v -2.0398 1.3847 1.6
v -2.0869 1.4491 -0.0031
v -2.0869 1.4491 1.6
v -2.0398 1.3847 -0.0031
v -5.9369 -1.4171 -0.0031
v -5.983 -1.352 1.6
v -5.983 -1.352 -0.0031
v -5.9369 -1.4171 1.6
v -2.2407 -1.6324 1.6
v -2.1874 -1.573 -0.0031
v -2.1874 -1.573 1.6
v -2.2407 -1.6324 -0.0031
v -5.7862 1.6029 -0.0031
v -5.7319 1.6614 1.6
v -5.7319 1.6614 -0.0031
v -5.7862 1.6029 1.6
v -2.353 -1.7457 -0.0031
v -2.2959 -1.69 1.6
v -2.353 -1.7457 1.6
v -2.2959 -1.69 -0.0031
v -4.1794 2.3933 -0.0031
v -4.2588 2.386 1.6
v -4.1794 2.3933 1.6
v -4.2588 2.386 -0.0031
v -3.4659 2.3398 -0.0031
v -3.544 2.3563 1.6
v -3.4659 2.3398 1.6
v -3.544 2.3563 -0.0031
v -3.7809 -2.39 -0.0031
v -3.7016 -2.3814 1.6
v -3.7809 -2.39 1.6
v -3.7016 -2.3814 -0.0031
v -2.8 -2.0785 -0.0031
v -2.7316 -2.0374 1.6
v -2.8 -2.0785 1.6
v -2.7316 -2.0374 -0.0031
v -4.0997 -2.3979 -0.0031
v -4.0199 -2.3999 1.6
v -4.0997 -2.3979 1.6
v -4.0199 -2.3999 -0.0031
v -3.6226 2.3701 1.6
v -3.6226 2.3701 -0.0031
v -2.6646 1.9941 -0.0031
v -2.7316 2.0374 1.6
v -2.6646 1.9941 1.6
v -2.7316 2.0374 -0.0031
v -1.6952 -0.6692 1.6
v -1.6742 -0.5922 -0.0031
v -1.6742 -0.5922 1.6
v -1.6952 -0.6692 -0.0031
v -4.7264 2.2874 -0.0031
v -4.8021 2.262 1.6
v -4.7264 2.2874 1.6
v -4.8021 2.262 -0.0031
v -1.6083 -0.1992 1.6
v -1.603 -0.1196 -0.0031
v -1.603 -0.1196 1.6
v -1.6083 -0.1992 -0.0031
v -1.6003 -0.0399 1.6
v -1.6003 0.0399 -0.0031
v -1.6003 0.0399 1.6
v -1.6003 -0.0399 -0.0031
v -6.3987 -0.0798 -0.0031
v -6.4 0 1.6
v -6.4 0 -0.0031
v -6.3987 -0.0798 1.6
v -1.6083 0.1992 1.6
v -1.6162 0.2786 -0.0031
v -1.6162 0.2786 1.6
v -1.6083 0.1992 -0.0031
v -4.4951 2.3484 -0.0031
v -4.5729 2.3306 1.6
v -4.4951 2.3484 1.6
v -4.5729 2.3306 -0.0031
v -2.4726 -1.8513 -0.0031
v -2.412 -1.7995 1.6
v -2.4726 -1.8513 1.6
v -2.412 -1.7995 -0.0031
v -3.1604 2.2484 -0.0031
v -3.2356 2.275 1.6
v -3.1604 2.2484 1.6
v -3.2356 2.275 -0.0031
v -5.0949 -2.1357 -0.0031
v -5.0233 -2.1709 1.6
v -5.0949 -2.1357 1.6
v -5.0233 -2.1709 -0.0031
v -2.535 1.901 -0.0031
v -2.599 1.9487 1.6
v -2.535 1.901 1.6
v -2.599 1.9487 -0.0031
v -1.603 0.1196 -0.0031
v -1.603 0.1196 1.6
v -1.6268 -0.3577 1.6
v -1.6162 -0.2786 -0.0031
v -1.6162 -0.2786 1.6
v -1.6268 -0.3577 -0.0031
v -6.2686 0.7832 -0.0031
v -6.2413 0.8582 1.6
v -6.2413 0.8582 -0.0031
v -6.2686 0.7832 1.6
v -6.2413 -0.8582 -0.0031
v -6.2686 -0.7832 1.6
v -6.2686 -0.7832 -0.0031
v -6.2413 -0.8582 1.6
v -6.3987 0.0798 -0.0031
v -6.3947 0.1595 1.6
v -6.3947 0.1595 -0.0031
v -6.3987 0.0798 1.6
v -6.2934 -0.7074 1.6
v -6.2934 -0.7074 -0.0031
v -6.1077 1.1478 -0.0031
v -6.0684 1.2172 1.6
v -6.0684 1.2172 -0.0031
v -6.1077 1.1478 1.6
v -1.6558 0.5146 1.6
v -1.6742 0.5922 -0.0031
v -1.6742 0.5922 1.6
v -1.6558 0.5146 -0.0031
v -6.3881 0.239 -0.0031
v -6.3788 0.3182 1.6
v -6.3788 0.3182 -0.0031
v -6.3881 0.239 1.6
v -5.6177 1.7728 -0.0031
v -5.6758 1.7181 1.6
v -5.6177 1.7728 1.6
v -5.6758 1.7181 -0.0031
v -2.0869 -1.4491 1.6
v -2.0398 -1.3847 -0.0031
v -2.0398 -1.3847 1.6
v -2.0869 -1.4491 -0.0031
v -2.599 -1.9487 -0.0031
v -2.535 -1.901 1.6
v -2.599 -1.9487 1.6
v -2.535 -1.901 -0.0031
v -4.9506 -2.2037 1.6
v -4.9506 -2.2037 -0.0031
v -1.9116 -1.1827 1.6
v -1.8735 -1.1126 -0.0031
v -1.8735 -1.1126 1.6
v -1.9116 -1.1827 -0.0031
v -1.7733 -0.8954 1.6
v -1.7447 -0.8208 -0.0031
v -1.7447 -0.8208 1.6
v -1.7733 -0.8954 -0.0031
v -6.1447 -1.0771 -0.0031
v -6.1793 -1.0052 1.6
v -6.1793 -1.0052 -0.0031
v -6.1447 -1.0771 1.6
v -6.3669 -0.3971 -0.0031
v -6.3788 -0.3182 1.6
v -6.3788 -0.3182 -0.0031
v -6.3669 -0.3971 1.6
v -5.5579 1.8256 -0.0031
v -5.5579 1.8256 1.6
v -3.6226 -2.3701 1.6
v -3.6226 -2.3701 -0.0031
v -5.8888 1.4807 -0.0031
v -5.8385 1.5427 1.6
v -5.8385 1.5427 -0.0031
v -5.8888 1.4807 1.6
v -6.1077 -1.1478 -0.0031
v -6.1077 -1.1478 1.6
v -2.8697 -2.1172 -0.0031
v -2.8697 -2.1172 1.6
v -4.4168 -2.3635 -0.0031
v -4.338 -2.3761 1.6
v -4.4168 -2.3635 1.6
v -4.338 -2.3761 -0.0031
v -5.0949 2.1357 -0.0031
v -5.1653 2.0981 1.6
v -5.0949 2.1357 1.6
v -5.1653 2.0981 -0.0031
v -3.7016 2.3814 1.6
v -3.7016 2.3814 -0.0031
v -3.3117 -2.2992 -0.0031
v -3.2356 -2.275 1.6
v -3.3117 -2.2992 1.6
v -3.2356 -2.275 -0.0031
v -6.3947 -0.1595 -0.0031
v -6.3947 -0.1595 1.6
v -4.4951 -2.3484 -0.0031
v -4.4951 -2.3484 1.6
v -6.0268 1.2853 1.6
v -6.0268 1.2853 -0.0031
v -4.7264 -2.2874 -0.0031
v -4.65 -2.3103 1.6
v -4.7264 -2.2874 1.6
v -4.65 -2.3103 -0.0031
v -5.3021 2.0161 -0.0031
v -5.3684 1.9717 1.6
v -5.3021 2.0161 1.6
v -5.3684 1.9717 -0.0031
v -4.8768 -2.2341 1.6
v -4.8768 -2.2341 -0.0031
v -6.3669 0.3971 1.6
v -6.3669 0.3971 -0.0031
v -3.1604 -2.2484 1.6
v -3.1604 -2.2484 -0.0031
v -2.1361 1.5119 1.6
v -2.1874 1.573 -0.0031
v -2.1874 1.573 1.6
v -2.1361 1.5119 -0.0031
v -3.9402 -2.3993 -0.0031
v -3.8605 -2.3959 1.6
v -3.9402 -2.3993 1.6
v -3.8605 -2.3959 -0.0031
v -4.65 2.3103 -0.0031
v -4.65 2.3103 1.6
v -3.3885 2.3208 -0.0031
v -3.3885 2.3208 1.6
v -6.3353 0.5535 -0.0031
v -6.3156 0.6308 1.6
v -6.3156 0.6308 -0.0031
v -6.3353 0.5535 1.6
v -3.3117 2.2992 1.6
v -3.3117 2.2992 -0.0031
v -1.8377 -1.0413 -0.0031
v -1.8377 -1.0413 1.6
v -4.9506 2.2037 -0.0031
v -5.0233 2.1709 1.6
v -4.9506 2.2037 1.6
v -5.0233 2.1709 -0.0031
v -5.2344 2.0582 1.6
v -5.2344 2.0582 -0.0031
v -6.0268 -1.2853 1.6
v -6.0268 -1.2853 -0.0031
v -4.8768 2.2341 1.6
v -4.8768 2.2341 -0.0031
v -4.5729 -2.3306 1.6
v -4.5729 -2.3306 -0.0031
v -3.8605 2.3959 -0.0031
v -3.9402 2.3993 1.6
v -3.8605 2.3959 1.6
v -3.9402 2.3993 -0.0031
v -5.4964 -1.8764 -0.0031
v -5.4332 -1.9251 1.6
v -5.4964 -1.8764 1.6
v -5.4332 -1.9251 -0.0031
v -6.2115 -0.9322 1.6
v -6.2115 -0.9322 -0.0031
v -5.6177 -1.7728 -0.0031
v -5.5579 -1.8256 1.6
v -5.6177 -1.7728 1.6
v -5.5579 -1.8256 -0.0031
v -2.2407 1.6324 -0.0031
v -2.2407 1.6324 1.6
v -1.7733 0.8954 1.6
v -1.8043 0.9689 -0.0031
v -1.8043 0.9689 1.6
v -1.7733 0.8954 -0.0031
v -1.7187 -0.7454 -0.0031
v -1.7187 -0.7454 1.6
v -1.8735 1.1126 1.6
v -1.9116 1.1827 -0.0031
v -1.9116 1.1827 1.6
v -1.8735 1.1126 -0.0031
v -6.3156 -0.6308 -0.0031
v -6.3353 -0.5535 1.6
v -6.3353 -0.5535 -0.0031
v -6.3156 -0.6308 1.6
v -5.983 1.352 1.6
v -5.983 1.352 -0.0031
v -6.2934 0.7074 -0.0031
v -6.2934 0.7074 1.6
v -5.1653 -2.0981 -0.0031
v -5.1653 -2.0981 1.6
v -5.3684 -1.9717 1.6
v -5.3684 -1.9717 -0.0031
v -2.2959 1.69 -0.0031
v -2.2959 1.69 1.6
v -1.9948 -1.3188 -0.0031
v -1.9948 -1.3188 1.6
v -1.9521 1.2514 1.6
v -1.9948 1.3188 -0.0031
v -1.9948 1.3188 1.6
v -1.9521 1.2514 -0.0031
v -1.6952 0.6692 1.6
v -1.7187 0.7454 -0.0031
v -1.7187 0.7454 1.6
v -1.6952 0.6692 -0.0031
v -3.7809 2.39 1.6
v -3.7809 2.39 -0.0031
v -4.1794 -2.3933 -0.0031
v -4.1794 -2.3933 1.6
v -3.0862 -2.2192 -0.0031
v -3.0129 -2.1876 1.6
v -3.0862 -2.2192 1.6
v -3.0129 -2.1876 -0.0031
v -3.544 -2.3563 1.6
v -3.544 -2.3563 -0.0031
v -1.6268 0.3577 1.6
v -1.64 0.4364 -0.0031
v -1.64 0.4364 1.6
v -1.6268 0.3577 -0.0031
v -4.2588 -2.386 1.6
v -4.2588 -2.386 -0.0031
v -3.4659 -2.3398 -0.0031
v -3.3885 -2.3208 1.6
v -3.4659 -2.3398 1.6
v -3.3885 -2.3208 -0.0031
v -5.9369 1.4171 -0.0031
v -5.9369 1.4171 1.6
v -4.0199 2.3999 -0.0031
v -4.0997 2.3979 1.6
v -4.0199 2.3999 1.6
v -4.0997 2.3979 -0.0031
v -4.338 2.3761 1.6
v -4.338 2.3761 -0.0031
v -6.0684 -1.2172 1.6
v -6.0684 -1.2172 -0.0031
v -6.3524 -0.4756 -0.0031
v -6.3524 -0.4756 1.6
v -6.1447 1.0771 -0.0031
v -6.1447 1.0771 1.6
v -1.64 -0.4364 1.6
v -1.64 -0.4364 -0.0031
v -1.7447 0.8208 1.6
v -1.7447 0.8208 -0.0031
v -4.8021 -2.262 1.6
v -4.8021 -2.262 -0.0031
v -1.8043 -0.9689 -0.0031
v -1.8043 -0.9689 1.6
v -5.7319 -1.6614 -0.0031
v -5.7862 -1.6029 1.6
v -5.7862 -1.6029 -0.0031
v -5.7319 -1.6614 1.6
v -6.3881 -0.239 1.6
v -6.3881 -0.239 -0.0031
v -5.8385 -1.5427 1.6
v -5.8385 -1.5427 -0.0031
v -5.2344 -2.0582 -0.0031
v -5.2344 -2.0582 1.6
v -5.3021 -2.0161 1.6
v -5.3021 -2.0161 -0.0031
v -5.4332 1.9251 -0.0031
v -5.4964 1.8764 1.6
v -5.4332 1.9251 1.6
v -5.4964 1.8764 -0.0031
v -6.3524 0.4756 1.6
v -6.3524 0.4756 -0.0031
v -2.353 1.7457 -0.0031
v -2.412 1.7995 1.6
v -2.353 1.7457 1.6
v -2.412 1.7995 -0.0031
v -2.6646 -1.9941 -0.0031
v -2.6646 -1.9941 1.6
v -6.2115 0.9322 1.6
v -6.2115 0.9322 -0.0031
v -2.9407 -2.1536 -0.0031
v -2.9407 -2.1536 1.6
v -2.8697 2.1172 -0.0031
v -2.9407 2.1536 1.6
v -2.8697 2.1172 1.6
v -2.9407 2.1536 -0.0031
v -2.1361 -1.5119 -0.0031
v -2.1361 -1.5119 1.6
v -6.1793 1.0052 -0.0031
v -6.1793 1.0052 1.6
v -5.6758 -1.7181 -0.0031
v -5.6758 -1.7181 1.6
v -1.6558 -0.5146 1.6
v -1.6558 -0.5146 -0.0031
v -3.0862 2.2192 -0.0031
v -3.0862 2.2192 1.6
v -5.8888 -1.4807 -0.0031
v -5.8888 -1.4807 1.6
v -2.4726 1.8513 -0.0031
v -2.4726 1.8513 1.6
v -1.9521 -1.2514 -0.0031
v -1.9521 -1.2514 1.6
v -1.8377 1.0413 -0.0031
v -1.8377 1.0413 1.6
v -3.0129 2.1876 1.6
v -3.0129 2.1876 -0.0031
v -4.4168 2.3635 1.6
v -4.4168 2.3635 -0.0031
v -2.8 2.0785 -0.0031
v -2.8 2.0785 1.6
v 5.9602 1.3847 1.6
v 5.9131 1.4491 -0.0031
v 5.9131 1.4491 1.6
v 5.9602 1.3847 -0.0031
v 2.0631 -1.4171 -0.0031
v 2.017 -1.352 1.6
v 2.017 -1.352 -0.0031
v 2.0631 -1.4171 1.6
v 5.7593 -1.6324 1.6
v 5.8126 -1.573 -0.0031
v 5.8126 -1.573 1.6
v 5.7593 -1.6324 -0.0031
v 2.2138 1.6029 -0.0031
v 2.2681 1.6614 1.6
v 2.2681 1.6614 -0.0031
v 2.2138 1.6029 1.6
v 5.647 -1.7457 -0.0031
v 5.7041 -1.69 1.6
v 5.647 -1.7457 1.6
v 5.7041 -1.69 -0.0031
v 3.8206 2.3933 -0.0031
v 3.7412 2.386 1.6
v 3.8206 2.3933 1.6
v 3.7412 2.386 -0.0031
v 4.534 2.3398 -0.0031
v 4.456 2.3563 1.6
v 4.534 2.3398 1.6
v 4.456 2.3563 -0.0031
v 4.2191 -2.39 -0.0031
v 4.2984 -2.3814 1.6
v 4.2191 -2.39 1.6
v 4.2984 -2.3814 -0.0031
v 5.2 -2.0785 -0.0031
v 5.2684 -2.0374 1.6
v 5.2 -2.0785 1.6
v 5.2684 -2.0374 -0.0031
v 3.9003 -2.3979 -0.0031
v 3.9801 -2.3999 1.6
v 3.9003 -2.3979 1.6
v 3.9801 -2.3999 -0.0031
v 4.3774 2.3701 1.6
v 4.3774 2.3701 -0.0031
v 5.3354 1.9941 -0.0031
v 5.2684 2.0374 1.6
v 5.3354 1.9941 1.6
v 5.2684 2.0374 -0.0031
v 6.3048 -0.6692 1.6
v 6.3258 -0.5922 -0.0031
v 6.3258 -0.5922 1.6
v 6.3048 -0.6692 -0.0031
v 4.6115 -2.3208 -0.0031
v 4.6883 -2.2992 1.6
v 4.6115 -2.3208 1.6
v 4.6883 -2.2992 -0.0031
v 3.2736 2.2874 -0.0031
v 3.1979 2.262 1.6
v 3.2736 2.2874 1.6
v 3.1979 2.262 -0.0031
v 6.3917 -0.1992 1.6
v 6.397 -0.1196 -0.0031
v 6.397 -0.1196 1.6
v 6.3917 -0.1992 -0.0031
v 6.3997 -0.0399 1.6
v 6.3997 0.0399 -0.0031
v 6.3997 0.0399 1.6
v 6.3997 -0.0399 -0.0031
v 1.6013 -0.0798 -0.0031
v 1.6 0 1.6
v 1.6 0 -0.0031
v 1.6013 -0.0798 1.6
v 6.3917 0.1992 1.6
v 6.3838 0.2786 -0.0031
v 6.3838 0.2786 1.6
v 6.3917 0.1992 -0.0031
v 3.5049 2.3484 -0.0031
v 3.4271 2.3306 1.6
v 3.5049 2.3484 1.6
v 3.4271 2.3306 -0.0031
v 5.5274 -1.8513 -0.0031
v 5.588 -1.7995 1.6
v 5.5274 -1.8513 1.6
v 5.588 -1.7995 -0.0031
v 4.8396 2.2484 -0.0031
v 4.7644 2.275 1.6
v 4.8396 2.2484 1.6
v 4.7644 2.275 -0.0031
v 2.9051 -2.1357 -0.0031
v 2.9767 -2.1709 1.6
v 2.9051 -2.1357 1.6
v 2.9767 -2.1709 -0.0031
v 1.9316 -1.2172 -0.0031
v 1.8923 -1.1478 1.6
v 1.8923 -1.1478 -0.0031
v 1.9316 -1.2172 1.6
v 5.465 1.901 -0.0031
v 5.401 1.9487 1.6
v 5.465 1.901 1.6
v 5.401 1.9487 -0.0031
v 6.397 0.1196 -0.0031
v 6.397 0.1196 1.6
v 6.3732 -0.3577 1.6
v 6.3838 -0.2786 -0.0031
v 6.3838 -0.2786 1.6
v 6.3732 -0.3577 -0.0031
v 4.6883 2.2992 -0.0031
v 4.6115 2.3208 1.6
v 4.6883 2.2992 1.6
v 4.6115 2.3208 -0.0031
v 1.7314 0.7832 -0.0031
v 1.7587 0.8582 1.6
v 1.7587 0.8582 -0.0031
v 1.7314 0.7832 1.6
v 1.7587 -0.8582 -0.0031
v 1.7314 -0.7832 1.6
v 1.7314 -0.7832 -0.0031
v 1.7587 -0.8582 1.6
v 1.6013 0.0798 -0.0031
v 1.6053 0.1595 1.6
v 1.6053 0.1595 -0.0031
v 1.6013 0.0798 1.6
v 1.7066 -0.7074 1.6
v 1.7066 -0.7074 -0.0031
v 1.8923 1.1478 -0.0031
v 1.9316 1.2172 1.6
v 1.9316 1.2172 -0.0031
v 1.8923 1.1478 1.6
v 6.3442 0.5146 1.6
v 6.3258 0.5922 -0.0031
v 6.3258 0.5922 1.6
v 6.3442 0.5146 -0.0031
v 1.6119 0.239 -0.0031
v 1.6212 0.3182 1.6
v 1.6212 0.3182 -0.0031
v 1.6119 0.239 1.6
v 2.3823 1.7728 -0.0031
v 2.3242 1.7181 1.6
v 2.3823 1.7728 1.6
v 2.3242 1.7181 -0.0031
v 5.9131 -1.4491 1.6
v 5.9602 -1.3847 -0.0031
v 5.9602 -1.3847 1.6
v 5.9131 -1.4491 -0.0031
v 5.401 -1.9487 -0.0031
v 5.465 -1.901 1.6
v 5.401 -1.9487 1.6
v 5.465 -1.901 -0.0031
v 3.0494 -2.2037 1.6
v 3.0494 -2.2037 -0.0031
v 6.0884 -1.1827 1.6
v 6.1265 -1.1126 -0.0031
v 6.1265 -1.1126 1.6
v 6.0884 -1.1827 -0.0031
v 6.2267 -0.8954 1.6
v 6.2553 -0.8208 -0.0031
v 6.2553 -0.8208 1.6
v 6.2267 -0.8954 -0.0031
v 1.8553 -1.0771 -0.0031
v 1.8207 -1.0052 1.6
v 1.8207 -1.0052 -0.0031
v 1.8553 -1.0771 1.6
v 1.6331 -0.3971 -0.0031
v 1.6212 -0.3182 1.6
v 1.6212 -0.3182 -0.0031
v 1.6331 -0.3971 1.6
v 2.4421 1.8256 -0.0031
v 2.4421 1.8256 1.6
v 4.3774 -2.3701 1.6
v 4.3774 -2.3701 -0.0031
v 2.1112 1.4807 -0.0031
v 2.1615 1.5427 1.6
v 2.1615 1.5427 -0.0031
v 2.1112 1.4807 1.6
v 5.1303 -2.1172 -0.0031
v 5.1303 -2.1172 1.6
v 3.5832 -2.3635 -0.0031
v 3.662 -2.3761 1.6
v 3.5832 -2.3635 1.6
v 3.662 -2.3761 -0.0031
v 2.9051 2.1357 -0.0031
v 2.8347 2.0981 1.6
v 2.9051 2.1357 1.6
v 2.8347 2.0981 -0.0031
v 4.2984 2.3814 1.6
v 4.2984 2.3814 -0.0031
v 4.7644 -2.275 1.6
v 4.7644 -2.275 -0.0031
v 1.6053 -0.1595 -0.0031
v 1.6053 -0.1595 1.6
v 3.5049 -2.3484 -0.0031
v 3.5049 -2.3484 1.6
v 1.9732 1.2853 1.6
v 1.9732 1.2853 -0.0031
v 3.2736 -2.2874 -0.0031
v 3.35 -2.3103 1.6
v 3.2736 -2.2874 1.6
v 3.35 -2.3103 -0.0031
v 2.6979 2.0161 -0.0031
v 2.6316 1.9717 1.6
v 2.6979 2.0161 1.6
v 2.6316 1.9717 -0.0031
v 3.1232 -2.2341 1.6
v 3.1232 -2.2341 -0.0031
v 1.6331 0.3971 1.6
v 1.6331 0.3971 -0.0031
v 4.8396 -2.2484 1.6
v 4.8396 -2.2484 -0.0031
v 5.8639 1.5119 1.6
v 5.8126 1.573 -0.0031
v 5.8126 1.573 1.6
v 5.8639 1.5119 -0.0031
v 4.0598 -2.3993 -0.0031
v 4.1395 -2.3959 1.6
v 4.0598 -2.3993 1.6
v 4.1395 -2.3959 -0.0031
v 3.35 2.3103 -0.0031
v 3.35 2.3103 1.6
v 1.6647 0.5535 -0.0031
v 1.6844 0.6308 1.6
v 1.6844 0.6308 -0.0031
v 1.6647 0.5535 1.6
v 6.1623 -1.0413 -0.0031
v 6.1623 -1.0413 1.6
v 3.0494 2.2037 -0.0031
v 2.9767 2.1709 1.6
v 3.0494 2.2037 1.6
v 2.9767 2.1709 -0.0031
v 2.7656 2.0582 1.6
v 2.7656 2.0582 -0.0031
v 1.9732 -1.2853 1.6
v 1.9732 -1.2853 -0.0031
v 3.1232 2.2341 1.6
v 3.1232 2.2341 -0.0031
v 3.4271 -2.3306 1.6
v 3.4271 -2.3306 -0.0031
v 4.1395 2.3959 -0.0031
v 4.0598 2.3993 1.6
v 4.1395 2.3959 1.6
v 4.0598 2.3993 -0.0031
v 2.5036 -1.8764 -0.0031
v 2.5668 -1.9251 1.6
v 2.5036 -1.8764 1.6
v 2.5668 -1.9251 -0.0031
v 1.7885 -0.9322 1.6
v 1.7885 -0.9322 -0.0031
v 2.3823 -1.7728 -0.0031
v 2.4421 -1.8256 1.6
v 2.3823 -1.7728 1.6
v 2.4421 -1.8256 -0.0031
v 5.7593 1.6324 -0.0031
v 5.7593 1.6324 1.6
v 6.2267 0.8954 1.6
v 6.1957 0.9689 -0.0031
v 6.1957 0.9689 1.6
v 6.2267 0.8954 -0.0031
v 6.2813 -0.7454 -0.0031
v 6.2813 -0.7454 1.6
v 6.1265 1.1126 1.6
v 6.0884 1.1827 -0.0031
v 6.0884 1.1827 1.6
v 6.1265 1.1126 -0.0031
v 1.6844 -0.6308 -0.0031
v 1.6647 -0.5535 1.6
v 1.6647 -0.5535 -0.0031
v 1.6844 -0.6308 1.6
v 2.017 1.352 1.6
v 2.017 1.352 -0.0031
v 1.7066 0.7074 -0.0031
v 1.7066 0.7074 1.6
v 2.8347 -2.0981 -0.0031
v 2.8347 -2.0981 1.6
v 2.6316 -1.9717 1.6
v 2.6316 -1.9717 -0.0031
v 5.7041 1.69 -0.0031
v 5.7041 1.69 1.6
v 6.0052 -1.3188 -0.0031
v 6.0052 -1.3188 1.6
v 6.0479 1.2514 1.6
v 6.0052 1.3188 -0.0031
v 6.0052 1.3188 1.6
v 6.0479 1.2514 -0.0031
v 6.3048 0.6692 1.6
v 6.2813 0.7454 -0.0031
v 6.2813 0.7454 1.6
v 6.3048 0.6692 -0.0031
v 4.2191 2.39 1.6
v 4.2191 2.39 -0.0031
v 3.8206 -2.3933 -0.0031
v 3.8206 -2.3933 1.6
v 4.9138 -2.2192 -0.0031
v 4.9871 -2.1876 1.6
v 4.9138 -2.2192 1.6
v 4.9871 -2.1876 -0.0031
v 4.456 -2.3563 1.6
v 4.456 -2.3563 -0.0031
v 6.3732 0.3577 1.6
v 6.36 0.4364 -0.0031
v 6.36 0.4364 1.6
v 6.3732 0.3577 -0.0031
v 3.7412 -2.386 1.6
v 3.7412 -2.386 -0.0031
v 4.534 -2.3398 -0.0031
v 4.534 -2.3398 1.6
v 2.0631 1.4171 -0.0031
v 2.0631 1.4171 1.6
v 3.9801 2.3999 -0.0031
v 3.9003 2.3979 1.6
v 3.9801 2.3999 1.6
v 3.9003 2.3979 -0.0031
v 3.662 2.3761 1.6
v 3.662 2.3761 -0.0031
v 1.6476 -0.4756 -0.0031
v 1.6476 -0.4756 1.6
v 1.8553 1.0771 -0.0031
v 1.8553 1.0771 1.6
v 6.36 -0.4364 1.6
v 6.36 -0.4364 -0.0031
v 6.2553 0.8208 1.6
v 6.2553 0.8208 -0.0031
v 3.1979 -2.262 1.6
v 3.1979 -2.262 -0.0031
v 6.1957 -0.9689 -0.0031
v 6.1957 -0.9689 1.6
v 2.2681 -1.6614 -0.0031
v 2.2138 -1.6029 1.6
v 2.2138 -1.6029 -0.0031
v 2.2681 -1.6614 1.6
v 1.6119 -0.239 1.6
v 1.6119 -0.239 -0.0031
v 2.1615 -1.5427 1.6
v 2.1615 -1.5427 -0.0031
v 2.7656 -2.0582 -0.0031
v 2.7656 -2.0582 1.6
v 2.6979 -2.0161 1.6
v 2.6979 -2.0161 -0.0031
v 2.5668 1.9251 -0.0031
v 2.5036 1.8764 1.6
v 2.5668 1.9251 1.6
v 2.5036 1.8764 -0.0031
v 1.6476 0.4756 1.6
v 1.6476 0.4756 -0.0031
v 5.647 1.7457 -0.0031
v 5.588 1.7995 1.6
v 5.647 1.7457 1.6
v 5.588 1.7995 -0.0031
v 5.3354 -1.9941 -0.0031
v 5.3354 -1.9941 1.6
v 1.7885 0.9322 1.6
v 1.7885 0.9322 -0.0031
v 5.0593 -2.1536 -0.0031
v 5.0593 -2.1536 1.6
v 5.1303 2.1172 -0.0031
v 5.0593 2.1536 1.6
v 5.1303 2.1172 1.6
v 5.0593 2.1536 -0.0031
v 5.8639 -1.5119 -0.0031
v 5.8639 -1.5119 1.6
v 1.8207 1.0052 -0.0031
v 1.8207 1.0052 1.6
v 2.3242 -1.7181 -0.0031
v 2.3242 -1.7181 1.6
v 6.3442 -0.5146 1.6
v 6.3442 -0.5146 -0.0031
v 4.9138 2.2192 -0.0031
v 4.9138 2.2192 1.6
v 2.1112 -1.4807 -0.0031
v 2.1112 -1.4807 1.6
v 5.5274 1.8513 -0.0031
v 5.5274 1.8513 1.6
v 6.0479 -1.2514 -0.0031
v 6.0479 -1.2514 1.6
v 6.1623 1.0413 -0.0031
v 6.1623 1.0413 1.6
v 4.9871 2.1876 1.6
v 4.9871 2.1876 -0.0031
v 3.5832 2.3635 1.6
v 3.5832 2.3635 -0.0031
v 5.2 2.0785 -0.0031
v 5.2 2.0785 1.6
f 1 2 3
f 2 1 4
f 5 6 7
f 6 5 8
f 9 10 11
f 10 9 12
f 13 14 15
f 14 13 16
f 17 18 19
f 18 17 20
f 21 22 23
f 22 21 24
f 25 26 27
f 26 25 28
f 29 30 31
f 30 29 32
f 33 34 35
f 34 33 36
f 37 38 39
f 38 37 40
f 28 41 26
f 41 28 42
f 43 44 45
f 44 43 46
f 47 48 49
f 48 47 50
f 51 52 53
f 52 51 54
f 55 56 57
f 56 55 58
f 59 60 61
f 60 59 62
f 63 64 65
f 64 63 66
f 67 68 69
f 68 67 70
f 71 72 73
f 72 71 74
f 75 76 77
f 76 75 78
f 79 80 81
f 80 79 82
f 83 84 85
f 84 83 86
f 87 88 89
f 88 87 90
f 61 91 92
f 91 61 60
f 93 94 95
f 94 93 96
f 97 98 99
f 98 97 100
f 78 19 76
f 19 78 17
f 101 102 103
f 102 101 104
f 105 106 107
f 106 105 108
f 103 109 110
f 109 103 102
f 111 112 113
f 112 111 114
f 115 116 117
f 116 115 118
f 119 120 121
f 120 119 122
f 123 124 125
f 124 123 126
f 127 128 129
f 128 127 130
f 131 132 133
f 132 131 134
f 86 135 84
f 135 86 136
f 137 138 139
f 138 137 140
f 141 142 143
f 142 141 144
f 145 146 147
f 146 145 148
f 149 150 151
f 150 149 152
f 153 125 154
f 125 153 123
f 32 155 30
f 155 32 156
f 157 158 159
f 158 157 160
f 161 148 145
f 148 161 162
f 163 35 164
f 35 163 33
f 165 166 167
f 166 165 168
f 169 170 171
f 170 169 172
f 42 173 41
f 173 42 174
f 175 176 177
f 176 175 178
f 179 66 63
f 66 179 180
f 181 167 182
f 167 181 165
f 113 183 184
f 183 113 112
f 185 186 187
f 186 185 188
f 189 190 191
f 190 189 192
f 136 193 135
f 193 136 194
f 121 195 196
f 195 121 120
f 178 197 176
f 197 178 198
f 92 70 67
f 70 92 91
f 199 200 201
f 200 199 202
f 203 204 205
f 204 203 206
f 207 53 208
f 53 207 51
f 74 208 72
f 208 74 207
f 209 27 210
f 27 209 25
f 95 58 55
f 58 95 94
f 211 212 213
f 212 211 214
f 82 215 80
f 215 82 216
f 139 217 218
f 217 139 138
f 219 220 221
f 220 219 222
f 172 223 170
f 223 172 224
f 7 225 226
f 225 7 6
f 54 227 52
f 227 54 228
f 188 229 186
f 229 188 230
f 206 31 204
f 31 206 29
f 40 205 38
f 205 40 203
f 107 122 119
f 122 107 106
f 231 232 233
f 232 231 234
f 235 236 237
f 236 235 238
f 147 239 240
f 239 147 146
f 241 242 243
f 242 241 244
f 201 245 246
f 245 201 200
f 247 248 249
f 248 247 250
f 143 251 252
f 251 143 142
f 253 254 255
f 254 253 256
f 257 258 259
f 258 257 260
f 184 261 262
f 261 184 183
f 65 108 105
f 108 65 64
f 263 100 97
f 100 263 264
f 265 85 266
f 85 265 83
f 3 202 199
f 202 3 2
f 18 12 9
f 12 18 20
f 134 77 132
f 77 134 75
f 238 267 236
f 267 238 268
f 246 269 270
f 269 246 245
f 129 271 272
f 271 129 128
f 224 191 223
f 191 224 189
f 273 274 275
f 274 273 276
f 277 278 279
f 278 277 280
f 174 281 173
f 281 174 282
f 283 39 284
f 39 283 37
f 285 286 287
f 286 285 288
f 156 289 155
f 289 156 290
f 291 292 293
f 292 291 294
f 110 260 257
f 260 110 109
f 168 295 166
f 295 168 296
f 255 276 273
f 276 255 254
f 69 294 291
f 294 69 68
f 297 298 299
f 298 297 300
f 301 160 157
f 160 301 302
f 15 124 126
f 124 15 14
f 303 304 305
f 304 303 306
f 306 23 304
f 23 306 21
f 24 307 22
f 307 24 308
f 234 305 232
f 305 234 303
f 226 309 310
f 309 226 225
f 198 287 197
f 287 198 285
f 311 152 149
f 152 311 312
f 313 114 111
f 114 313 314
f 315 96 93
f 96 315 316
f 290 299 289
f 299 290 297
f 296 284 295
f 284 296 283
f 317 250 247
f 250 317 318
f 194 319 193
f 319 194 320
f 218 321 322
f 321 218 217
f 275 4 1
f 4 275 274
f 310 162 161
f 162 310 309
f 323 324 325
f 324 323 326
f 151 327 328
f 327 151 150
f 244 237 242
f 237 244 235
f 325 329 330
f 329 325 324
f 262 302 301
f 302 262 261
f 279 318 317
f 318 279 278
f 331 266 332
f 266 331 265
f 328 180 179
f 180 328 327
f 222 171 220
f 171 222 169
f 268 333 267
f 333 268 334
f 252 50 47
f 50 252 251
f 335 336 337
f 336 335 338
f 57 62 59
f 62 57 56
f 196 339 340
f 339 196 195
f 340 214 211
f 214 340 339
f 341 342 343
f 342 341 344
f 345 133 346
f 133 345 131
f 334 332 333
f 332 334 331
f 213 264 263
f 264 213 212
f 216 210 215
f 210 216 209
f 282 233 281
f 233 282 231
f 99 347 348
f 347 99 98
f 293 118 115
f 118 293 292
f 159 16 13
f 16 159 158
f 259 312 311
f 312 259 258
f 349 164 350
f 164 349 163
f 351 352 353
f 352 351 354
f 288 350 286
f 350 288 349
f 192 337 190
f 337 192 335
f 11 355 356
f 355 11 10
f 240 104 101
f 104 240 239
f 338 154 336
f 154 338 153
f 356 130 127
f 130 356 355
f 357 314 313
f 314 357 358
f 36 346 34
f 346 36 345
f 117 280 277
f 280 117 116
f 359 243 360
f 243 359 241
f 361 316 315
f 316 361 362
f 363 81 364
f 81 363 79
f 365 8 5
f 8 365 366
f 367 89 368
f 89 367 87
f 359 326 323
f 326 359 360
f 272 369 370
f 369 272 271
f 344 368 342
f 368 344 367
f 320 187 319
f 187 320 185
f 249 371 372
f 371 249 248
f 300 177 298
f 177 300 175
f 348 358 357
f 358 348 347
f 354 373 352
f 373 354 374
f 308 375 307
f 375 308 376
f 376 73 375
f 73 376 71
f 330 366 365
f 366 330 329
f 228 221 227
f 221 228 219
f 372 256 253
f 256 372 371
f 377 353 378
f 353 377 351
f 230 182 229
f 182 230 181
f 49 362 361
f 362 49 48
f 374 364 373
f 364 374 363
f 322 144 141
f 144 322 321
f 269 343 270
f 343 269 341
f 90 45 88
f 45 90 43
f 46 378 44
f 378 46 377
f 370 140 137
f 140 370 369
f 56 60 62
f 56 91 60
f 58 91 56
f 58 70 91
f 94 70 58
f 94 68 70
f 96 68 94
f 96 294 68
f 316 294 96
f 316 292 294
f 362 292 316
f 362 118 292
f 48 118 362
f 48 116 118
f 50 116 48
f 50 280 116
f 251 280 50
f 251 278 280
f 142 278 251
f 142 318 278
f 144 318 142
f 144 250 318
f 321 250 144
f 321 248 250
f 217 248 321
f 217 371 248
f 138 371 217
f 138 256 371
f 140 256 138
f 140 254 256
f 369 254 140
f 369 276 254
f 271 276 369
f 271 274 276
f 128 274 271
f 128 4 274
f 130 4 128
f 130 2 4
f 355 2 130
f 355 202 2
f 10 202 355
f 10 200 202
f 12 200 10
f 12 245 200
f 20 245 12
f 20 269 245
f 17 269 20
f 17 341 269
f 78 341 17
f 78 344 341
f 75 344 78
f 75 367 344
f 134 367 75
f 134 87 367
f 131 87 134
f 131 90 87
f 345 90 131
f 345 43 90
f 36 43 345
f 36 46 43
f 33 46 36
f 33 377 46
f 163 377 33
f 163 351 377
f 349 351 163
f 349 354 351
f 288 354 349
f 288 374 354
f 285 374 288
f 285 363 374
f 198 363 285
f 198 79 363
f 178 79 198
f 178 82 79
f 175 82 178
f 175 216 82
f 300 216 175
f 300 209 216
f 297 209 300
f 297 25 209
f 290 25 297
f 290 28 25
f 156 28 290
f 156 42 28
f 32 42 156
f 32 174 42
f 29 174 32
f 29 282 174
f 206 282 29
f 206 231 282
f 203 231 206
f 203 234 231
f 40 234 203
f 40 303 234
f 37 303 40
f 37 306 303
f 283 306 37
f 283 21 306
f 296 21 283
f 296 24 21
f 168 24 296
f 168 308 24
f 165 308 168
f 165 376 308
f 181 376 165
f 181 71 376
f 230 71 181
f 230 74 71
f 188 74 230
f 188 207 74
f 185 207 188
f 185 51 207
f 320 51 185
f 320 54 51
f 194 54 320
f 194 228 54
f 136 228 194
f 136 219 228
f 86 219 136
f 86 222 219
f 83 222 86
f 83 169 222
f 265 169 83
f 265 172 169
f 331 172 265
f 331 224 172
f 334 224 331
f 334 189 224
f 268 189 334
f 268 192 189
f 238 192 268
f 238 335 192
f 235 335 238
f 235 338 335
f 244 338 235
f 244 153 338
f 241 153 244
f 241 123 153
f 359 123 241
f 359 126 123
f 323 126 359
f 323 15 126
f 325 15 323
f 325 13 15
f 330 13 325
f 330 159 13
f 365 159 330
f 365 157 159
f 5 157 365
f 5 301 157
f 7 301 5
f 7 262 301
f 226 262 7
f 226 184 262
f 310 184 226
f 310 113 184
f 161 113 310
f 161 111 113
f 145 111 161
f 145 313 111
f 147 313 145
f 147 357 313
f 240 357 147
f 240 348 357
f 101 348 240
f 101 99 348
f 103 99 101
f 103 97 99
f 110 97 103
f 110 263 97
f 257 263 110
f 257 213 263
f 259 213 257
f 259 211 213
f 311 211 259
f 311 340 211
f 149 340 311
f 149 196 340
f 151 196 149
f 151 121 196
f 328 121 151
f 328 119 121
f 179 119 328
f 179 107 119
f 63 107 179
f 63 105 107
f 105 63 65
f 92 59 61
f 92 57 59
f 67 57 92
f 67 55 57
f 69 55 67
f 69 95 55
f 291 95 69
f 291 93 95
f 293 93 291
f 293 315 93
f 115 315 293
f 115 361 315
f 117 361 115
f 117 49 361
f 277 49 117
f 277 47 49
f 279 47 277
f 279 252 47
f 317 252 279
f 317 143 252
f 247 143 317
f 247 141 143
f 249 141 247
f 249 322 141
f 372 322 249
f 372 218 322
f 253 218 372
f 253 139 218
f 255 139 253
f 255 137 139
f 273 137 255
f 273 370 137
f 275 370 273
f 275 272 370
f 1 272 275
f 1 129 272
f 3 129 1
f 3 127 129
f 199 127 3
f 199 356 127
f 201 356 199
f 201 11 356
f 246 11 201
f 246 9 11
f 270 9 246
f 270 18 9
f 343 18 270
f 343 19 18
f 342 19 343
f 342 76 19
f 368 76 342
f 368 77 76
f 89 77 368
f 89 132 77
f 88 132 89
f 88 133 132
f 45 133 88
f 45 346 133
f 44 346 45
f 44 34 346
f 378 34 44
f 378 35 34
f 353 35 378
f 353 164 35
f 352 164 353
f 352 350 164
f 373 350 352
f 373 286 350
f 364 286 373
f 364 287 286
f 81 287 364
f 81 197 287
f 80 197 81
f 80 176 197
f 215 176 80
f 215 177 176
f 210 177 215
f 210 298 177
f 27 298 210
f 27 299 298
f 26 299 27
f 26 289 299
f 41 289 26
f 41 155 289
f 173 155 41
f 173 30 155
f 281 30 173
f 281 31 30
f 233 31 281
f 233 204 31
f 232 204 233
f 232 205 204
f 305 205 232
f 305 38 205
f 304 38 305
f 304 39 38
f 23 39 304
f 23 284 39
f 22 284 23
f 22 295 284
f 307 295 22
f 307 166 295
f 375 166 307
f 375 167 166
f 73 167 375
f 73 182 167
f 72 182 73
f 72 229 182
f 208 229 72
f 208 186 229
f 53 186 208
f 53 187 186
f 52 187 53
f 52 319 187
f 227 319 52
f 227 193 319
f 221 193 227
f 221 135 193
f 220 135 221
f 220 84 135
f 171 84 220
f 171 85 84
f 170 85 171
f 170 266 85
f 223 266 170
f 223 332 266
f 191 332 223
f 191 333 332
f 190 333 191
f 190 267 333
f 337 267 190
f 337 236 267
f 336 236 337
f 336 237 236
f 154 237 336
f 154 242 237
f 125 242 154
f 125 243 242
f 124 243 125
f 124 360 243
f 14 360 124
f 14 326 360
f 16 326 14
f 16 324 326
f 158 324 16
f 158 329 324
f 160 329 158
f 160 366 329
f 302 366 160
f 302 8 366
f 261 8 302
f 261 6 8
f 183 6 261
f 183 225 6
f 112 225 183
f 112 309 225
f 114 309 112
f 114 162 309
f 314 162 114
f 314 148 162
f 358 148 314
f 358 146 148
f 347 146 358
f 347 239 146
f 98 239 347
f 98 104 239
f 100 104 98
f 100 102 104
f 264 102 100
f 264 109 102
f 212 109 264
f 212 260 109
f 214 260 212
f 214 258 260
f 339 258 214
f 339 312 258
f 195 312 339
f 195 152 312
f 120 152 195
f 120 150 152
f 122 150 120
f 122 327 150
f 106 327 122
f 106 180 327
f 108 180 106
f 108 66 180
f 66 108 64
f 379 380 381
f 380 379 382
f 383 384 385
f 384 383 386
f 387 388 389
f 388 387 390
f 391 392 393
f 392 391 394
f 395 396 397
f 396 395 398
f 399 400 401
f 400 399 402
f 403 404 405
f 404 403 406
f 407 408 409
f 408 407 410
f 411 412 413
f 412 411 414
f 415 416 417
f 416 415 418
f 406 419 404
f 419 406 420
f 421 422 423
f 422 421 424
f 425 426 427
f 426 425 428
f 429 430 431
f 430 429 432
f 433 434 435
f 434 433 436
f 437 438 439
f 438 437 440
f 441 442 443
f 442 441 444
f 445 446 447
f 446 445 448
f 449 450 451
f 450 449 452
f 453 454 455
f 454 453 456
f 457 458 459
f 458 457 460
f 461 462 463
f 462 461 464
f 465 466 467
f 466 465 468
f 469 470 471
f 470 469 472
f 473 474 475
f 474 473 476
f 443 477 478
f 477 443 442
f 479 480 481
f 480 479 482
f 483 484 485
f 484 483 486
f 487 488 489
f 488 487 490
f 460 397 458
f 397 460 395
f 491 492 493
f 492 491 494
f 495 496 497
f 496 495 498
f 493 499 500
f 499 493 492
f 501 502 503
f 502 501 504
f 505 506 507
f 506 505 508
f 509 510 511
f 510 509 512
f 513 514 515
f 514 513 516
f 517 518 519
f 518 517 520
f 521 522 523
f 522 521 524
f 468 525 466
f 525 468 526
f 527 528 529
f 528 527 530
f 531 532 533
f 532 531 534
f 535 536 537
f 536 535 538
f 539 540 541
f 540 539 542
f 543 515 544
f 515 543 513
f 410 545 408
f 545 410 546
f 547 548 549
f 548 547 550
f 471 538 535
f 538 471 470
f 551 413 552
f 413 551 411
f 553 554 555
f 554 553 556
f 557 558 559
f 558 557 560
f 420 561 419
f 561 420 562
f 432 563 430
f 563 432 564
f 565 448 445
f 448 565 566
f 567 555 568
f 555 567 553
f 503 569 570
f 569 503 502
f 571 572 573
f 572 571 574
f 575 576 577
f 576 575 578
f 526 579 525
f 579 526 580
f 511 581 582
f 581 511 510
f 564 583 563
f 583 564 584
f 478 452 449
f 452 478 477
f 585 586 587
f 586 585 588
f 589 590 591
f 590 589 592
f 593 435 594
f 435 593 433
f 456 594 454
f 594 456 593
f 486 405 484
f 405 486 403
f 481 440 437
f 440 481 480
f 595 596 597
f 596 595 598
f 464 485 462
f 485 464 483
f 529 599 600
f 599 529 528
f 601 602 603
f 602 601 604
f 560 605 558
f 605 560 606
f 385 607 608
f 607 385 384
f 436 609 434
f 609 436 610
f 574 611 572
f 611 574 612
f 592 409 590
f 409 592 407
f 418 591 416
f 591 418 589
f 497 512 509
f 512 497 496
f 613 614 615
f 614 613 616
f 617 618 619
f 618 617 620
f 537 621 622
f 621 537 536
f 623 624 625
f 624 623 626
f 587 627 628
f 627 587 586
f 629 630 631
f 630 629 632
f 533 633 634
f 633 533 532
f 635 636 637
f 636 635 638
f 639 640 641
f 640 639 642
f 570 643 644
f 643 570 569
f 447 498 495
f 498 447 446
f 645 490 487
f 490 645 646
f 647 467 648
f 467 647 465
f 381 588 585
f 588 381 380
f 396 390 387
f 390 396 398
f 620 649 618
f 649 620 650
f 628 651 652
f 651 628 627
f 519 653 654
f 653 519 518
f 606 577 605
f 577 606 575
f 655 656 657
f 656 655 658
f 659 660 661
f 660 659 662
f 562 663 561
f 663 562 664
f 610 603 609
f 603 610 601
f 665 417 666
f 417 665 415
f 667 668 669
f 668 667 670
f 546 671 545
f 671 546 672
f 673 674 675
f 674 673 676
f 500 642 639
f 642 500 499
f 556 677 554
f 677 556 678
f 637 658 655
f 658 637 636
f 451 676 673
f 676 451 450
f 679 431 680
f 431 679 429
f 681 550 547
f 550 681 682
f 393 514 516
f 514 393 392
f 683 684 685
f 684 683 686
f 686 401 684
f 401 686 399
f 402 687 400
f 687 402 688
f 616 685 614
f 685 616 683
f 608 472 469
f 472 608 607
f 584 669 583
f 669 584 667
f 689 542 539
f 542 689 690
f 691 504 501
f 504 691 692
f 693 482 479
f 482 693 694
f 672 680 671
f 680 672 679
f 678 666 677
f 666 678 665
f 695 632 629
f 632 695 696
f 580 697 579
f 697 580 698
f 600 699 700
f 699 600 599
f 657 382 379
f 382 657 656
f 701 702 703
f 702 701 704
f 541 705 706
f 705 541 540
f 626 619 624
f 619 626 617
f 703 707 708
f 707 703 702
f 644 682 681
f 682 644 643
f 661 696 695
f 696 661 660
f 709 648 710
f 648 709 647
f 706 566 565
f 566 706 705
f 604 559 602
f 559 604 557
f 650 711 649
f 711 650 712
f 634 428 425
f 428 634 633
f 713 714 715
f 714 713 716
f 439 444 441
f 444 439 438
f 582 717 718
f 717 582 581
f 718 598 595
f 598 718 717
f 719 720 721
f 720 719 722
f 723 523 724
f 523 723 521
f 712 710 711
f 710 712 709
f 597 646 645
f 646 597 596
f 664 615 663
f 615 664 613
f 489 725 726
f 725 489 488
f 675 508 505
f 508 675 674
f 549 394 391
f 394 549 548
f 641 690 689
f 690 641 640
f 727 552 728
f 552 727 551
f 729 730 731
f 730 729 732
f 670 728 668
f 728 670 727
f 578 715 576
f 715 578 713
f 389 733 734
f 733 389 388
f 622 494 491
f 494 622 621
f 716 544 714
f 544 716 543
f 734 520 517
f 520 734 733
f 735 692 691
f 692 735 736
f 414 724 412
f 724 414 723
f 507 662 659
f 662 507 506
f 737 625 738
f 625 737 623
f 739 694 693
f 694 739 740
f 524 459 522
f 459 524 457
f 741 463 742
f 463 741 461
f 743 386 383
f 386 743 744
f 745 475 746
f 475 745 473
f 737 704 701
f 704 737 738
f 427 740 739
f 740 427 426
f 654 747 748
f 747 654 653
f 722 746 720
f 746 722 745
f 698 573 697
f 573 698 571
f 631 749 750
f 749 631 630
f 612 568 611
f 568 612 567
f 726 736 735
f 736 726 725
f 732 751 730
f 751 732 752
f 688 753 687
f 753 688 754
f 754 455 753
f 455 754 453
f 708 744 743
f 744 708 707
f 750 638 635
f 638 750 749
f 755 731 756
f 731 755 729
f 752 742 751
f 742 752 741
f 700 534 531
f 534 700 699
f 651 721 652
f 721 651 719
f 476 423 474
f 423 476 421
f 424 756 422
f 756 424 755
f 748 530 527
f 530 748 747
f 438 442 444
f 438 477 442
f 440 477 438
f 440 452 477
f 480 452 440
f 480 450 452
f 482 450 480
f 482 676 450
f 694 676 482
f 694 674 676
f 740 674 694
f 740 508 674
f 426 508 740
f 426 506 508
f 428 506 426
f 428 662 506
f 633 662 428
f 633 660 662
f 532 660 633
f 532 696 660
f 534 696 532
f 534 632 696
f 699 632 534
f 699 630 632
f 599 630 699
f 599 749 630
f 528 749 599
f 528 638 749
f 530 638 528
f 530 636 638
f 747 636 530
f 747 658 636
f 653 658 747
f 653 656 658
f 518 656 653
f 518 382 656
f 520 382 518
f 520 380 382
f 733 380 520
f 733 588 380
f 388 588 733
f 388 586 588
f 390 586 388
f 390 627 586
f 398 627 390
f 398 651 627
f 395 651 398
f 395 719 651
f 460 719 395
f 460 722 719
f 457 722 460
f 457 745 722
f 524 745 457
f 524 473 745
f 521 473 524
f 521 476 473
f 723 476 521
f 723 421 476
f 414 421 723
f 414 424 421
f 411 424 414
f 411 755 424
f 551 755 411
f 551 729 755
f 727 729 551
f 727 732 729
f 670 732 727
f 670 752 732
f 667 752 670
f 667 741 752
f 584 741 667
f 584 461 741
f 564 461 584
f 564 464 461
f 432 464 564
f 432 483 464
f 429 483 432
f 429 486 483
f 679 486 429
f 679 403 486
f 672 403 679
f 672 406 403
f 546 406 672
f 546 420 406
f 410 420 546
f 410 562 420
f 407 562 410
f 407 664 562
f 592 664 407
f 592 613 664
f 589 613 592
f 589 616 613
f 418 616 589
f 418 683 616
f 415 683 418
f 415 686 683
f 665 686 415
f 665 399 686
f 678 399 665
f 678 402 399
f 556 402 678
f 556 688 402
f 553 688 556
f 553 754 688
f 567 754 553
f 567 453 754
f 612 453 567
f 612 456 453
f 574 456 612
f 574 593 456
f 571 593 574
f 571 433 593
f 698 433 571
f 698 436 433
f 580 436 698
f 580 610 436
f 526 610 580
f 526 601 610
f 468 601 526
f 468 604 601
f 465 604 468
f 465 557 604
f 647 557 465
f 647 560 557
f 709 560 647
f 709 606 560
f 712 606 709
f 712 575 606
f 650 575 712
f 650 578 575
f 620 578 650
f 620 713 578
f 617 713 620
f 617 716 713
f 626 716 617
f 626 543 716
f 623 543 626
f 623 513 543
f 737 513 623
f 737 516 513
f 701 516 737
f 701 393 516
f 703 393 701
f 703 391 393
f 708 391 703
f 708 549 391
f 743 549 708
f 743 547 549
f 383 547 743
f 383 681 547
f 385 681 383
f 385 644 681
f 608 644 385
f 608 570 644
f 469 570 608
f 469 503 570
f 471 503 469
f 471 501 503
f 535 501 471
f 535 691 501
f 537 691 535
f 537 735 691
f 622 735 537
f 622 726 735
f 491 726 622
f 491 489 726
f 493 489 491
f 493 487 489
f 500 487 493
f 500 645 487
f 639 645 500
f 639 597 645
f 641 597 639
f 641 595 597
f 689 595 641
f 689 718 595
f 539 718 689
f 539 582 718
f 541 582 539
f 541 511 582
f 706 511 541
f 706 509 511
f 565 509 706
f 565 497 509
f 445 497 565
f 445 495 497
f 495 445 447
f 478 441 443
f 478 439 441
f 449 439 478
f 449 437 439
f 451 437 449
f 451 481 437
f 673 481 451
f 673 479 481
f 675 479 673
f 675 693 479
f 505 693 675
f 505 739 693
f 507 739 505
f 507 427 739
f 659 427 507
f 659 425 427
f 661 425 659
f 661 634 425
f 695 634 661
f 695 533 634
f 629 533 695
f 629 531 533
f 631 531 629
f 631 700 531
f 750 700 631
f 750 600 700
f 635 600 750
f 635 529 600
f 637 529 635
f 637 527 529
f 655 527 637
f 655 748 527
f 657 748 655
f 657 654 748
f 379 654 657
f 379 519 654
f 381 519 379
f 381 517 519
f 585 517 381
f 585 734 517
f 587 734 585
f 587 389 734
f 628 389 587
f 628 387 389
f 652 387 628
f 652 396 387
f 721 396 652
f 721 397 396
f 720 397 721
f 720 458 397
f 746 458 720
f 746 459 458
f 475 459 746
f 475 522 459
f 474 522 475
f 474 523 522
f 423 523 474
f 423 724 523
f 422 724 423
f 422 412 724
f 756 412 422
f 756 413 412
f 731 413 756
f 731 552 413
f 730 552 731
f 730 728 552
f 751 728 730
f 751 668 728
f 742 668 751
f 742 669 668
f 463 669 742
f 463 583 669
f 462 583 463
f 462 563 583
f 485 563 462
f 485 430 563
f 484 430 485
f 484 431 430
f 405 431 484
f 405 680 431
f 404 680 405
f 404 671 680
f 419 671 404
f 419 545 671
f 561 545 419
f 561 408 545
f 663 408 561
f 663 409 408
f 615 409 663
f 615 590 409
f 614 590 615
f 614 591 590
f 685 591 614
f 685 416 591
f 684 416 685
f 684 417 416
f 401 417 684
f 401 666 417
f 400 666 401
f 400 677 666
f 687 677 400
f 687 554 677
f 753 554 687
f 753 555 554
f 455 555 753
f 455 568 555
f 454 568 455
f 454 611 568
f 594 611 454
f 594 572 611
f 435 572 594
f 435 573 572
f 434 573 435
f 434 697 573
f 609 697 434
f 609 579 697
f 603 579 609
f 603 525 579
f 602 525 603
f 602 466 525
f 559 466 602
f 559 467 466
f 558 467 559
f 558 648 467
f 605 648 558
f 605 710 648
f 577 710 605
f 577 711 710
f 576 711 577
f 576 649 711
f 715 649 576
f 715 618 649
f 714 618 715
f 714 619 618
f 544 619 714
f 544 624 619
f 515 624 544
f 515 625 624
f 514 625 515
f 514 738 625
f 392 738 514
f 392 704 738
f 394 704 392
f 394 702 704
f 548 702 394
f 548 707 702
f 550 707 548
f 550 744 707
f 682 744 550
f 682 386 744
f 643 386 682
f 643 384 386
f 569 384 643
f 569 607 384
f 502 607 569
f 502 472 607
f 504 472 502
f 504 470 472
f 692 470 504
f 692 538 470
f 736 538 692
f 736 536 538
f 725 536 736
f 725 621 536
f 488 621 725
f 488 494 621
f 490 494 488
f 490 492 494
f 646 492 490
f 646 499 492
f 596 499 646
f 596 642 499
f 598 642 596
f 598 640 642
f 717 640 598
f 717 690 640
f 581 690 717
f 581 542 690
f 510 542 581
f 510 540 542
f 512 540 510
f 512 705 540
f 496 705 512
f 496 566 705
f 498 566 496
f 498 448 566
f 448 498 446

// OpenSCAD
use <../lib.scad>
use <../p/box2-5.scad>
use <../p/box2-7.scad>
use <../p/box3u2p.scad>
use <../p/box3u7a.scad>
use <../p/box5-4a.scad>
use <../p/rect.scad>
use <../p/rect3.scad>
use <../p/recte4.scad>
use <../p/stud.scad>
$fa=1; $fs=0.2;
function ldraw_lib__4762(realsolid=false) = [
// 0 ~Electric  9V Battery Box  4 x  8 x  2.333 Switch
// 0 Name: 4762.dat
// 0 Author: Jonathan Wilson [jonwil]
// 0 !LDRAW_ORG Part UPDATE 2011-01
// 0 !LICENSE Licensed under CC BY 2.0 and CC BY 4.0 : see CAreadme.txt
// 
// 0 BFC CERTIFY CCW
  [0,"BFC","CERTIFY"],
  [0,"BFC","CCW"],
// 
// 0 !HISTORY 1999-12-31 [PTadmin] Official Update 1999-06
// 0 !HISTORY 2011-07-15 [MagFors] Complete rewrite
// 0 !HISTORY 2011-07-25 [PTadmin] Official Update 2011-01
// 
// 
// 1 16 0 17 1.5 4 0 0 0 2 0 0 0 3.5 box3u2p.dat
  [1,16,0,17,1.5,4,0,0,0,2,0,0,0,3.5, ldraw_lib__box3u2p(realsolid)],
// 1 16 0 19 -1.5 0 0 -4 0 -2 0 -0.5 0 0 box3u7a.dat
  [1,16,0,19,-1.5,0,0,-4,0,-2,0,-0.5,0,0, ldraw_lib__box3u7a(realsolid)],
// 1 16 0 19 4.5 0 0 4 0 -2 0 0.5 0 0 box3u7a.dat
  [1,16,0,19,4.5,0,0,4,0,-2,0,0.5,0,0, ldraw_lib__box3u7a(realsolid)],
// 1 16 0 8 1.5 0 0 8 0 -1 0 2.5 0 0 recte4.dat
  [1,16,0,8,1.5,0,0,8,0,-1,0,2.5,0,0, ldraw_lib__recte4(realsolid)],
// 1 16 6 13.5 1.5 0 0 2 0 4.5 -1 -2.5 0 0 box2-7.dat
  [1,16,6,13.5,1.5,0,0,2,0,4.5,-1,-2.5,0,0, ldraw_lib__box2_7(realsolid)],
// 1 16 -6 13.5 1.5 0 0 -2 0 4.5 -1 2.5 0 0 box2-7.dat
  [1,16,-6,13.5,1.5,0,0,-2,0,4.5,-1,2.5,0,0, ldraw_lib__box2_7(realsolid)],
// 4 16 8 8 4 4 17 4 -4 17 4 -8 8 4
  [4,16,8,8,4,4,17,4,-4,17,4,-8,8,4],
// 4 16 8 8 4 8 17 4 4 19 4 4 17 4
  [4,16,8,8,4,8,17,4,4,19,4,4,17,4],
// 4 16 -4 17 4 -4 19 4 -8 17 4 -8 8 4
  [4,16,-4,17,4,-4,19,4,-8,17,4,-8,8,4],
// 4 16 -8 8 -1 -4 17 -1 4 17 -1 8 8 -1
  [4,16,-8,8,-1,-4,17,-1,4,17,-1,8,8,-1],
// 4 16 -8 8 -1 -8 17 -1 -4 19 -1 -4 17 -1
  [4,16,-8,8,-1,-8,17,-1,-4,19,-1,-4,17,-1],
// 4 16 4 17 -1 4 19 -1 8 17 -1 8 8 -1
  [4,16,4,17,-1,4,19,-1,8,17,-1,8,8,-1],
// 2 24 -8 8 -7.5 -16 8 -7.5
  [2,24,-8,8,-7.5,-16,8,-7.5],
// 2 24 -16 8 -7.5 -16 8 6
  [2,24,-16,8,-7.5,-16,8,6],
// 2 24 -16 8 6 -13 8 6
  [2,24,-16,8,6,-13,8,6],
// 2 24 13 8 6 16 8 6
  [2,24,13,8,6,16,8,6],
// 2 24 16 8 6 16 8 -7.5
  [2,24,16,8,6,16,8,-7.5],
// 2 24 16 8 -7.5 8 8 -7.5
  [2,24,16,8,-7.5,8,8,-7.5],
// 1 16 -17 8.5 -1.25 -1 0 0 0 0.5 0 0 0.5 -5.75 box2-5.dat
  [1,16,-17,8.5,-1.25,-1,0,0,0,0.5,0,0,0.5,-5.75, ldraw_lib__box2_5(realsolid)],
// 1 16 -17 8.5 5.5 -1 0 0 0 0 -0.5 0 -1 0.5 rect3.dat
  [1,16,-17,8.5,5.5,-1,0,0,0,0,-0.5,0,-1,0.5, ldraw_lib__rect3(realsolid)],
// 4 16 -18 8 6 -18 9 5 -18 9 -6.5 -18 8 -7.5
  [4,16,-18,8,6,-18,9,5,-18,9,-6.5,-18,8,-7.5],
// 4 16 -16 8 -7.5 -16 9 -6.5 -16 9 5 -16 8 6
  [4,16,-16,8,-7.5,-16,9,-6.5,-16,9,5,-16,8,6],
// 1 16 17 8.5 -1.25 -1 0 0 0 0.5 0 0 0.5 -5.75 box2-5.dat
  [1,16,17,8.5,-1.25,-1,0,0,0,0.5,0,0,0.5,-5.75, ldraw_lib__box2_5(realsolid)],
// 1 16 17 8.5 5.5 -1 0 0 0 0 -0.5 0 -1 0.5 rect3.dat
  [1,16,17,8.5,5.5,-1,0,0,0,0,-0.5,0,-1,0.5, ldraw_lib__rect3(realsolid)],
// 4 16 16 8 6 16 9 5 16 9 -6.5 16 8 -7.5
  [4,16,16,8,6,16,9,5,16,9,-6.5,16,8,-7.5],
// 4 16 18 8 -7.5 18 9 -6.5 18 9 5 18 8 6
  [4,16,18,8,-7.5,18,9,-6.5,18,9,5,18,8,6],
// 4 16 8 8 -1 8 8 -7.5 -8 8 -7.5 -8 8 -1
  [4,16,8,8,-1,8,8,-7.5,-8,8,-7.5,-8,8,-1],
// 4 16 -8 8 -1 -8 8 -7.5 -16 8 -7.5 -16 8 6
  [4,16,-8,8,-1,-8,8,-7.5,-16,8,-7.5,-16,8,6],
// 4 16 16 8 6 16 8 -7.5 8 8 -7.5 8 8 -1
  [4,16,16,8,6,16,8,-7.5,8,8,-7.5,8,8,-1],
// 4 16 -13 8 6 -8 8 4 -8 8 -1 -16 8 6
  [4,16,-13,8,6,-8,8,4,-8,8,-1,-16,8,6],
// 4 16 13 8 6 16 8 6 8 8 -1 8 8 4
  [4,16,13,8,6,16,8,6,8,8,-1,8,8,4],
// 4 16 -13 8 6 13 8 6 8 8 4 -8 8 4
  [4,16,-13,8,6,13,8,6,8,8,4,-8,8,4],
// 2 24 -13 8 6 -13 0 6
  [2,24,-13,8,6,-13,0,6],
// 2 24 13 8 6 13 0 6
  [2,24,13,8,6,13,0,6],
// 2 24 13 0 6 18 0 6
  [2,24,13,0,6,18,0,6],
// 2 24 -13 0 6 -18 0 6
  [2,24,-13,0,6,-18,0,6],
// 4 16 18 0 6 18 8 6 16 8 6 13 0 6
  [4,16,18,0,6,18,8,6,16,8,6,13,0,6],
// 4 16 -13 0 6 -16 8 6 -18 8 6 -18 0 6
  [4,16,-13,0,6,-16,8,6,-18,8,6,-18,0,6],
// 3 16 16 8 6 13 8 6 13 0 6
  [3,16,16,8,6,13,8,6,13,0,6],
// 3 16 -13 8 6 -16 8 6 -13 0 6
  [3,16,-13,8,6,-16,8,6,-13,0,6],
// 1 16 -18 4 -0.75 0 1 0 0 0 -4 -6.75 0 0 rect3.dat
  [1,16,-18,4,-0.75,0,1,0,0,0,-4,-6.75,0,0, ldraw_lib__rect3(realsolid)],
// 1 16 18 4 -0.75 0 -1 0 0 0 -4 6.75 0 0 rect3.dat
  [1,16,18,4,-0.75,0,-1,0,0,0,-4,6.75,0,0, ldraw_lib__rect3(realsolid)],
// 1 16 0 4 6 13 0 0 0 0 -4 0 4 0 box5-4a.dat
  [1,16,0,4,6,13,0,0,0,0,-4,0,4,0, ldraw_lib__box5_4a(realsolid)],
// 0 BFC INVERTNEXT
  [0,"BFC","INVERTNEXT"],
// 1 16 0 4 4 12 0 0 0 0 -2 0 4 0 box5-4a.dat
  [1,16,0,4,4,12,0,0,0,0,-2,0,4,0, ldraw_lib__box5_4a(realsolid)],
// 0 BFC INVERTNEXT
  [0,"BFC","INVERTNEXT"],
// 1 16 -14 4 -1.75 0 0 -2 -2 0 0 0 5.75 0 box2-5.dat
  [1,16,-14,4,-1.75,0,0,-2,-2,0,0,0,5.75,0, ldraw_lib__box2_5(realsolid)],
// 0 BFC INVERTNEXT
  [0,"BFC","INVERTNEXT"],
// 1 16 14 4 -1.75 0 0 2 2 0 0 0 5.75 0 box2-5.dat
  [1,16,14,4,-1.75,0,0,2,2,0,0,0,5.75,0, ldraw_lib__box2_5(realsolid)],
// 2 24 -8 6 -7.5 -8 8 -7.5
  [2,24,-8,6,-7.5,-8,8,-7.5],
// 2 24 8 6 -7.5 8 8 -7.5
  [2,24,8,6,-7.5,8,8,-7.5],
// 2 24 -16 6 -7.5 -8 6 -7.5
  [2,24,-16,6,-7.5,-8,6,-7.5],
// 2 24 8 6 -7.5 16 6 -7.5
  [2,24,8,6,-7.5,16,6,-7.5],
// 2 24 -16 2 -7.5 16 2 -7.5
  [2,24,-16,2,-7.5,16,2,-7.5],
// 4 16 8 6 -8.5 8 7 -8.5 8 8 -7.5 8 6 -7.5
  [4,16,8,6,-8.5,8,7,-8.5,8,8,-7.5,8,6,-7.5],
// 4 16 -8 6 -7.5 -8 8 -7.5 -8 7 -8.5 -8 6 -8.5
  [4,16,-8,6,-7.5,-8,8,-7.5,-8,7,-8.5,-8,6,-8.5],
// 1 16 0 7.5 -8 8 0 0 0 0 -0.5 0 0.5 -0.5 rect.dat
  [1,16,0,7.5,-8,8,0,0,0,0,-0.5,0,0.5,-0.5, ldraw_lib__rect(realsolid)],
// 1 16 0 6.5 -8 -8 0 0 0 0 -0.5 0 -0.5 0 box2-7.dat
  [1,16,0,6.5,-8,-8,0,0,0,0,-0.5,0,-0.5,0, ldraw_lib__box2_7(realsolid)],
// 4 16 -12 6 4 -16 6 4 -16 6 -7.5 -8 6 -7.5
  [4,16,-12,6,4,-16,6,4,-16,6,-7.5,-8,6,-7.5],
// 4 16 12 6 4 8 6 -7.5 16 6 -7.5 16 6 4
  [4,16,12,6,4,8,6,-7.5,16,6,-7.5,16,6,4],
// 4 16 -8 6 -7.5 8 6 -7.5 12 6 4 -12 6 4
  [4,16,-8,6,-7.5,8,6,-7.5,12,6,4,-12,6,4],
// 4 16 -16 6 -7.5 -18 8 -7.5 -8 8 -7.5 -8 6 -7.5
  [4,16,-16,6,-7.5,-18,8,-7.5,-8,8,-7.5,-8,6,-7.5],
// 4 16 8 6 -7.5 8 8 -7.5 18 8 -7.5 16 6 -7.5
  [4,16,8,6,-7.5,8,8,-7.5,18,8,-7.5,16,6,-7.5],
// 4 16 -18 0 -7.5 -18 8 -7.5 -16 6 -7.5 -16 2 -7.5
  [4,16,-18,0,-7.5,-18,8,-7.5,-16,6,-7.5,-16,2,-7.5],
// 4 16 16 2 -7.5 16 6 -7.5 18 8 -7.5 18 0 -7.5
  [4,16,16,2,-7.5,16,6,-7.5,18,8,-7.5,18,0,-7.5],
// 3 16 -16 2 4 -12 2 4 -16 2 -7.5
  [3,16,-16,2,4,-12,2,4,-16,2,-7.5],
// 3 16 12 2 4 16 2 4 16 2 -7.5
  [3,16,12,2,4,16,2,4,16,2,-7.5],
// 4 16 -12 2 4 12 2 4 16 2 -7.5 -16 2 -7.5
  [4,16,-12,2,4,12,2,4,16,2,-7.5,-16,2,-7.5],
// 2 24 18 0 -7.5 -18 0 -7.5
  [2,24,18,0,-7.5,-18,0,-7.5],
// 4 16 -18 0 -7.5 -16 2 -7.5 16 2 -7.5 18 0 -7.5
  [4,16,-18,0,-7.5,-16,2,-7.5,16,2,-7.5,18,0,-7.5],
// 3 16 18 0 6 13 0 6 18 0 -7.5
  [3,16,18,0,6,13,0,6,18,0,-7.5],
// 3 16 -13 0 6 -18 0 6 -18 0 -7.5
  [3,16,-13,0,6,-18,0,6,-18,0,-7.5],
// 4 16 13 0 6 -13 0 6 -18 0 -7.5 18 0 -7.5
  [4,16,13,0,6,-13,0,6,-18,0,-7.5,18,0,-7.5],
// 1 16 -10 0 0 0 0 1 0 1 0 -1 0 0 stud.dat
  [1,16,-10,0,0,0,0,1,0,1,0,-1,0,0, ldraw_lib__stud(realsolid)],
// 1 16 10 0 0 0 0 1 0 1 0 -1 0 0 stud.dat
  [1,16,10,0,0,0,0,1,0,1,0,-1,0,0, ldraw_lib__stud(realsolid)],
];
module ldraw_lib__4762(step=0, col=false, unit=2/5, alt=false, line=0.2, solid=!$preview)
    makepoly(ldraw_lib__4762(solid), step=step, col=col, unit=unit, alt=alt, line=line, solid=solid);
ldraw_lib__4762(line=0.2);
